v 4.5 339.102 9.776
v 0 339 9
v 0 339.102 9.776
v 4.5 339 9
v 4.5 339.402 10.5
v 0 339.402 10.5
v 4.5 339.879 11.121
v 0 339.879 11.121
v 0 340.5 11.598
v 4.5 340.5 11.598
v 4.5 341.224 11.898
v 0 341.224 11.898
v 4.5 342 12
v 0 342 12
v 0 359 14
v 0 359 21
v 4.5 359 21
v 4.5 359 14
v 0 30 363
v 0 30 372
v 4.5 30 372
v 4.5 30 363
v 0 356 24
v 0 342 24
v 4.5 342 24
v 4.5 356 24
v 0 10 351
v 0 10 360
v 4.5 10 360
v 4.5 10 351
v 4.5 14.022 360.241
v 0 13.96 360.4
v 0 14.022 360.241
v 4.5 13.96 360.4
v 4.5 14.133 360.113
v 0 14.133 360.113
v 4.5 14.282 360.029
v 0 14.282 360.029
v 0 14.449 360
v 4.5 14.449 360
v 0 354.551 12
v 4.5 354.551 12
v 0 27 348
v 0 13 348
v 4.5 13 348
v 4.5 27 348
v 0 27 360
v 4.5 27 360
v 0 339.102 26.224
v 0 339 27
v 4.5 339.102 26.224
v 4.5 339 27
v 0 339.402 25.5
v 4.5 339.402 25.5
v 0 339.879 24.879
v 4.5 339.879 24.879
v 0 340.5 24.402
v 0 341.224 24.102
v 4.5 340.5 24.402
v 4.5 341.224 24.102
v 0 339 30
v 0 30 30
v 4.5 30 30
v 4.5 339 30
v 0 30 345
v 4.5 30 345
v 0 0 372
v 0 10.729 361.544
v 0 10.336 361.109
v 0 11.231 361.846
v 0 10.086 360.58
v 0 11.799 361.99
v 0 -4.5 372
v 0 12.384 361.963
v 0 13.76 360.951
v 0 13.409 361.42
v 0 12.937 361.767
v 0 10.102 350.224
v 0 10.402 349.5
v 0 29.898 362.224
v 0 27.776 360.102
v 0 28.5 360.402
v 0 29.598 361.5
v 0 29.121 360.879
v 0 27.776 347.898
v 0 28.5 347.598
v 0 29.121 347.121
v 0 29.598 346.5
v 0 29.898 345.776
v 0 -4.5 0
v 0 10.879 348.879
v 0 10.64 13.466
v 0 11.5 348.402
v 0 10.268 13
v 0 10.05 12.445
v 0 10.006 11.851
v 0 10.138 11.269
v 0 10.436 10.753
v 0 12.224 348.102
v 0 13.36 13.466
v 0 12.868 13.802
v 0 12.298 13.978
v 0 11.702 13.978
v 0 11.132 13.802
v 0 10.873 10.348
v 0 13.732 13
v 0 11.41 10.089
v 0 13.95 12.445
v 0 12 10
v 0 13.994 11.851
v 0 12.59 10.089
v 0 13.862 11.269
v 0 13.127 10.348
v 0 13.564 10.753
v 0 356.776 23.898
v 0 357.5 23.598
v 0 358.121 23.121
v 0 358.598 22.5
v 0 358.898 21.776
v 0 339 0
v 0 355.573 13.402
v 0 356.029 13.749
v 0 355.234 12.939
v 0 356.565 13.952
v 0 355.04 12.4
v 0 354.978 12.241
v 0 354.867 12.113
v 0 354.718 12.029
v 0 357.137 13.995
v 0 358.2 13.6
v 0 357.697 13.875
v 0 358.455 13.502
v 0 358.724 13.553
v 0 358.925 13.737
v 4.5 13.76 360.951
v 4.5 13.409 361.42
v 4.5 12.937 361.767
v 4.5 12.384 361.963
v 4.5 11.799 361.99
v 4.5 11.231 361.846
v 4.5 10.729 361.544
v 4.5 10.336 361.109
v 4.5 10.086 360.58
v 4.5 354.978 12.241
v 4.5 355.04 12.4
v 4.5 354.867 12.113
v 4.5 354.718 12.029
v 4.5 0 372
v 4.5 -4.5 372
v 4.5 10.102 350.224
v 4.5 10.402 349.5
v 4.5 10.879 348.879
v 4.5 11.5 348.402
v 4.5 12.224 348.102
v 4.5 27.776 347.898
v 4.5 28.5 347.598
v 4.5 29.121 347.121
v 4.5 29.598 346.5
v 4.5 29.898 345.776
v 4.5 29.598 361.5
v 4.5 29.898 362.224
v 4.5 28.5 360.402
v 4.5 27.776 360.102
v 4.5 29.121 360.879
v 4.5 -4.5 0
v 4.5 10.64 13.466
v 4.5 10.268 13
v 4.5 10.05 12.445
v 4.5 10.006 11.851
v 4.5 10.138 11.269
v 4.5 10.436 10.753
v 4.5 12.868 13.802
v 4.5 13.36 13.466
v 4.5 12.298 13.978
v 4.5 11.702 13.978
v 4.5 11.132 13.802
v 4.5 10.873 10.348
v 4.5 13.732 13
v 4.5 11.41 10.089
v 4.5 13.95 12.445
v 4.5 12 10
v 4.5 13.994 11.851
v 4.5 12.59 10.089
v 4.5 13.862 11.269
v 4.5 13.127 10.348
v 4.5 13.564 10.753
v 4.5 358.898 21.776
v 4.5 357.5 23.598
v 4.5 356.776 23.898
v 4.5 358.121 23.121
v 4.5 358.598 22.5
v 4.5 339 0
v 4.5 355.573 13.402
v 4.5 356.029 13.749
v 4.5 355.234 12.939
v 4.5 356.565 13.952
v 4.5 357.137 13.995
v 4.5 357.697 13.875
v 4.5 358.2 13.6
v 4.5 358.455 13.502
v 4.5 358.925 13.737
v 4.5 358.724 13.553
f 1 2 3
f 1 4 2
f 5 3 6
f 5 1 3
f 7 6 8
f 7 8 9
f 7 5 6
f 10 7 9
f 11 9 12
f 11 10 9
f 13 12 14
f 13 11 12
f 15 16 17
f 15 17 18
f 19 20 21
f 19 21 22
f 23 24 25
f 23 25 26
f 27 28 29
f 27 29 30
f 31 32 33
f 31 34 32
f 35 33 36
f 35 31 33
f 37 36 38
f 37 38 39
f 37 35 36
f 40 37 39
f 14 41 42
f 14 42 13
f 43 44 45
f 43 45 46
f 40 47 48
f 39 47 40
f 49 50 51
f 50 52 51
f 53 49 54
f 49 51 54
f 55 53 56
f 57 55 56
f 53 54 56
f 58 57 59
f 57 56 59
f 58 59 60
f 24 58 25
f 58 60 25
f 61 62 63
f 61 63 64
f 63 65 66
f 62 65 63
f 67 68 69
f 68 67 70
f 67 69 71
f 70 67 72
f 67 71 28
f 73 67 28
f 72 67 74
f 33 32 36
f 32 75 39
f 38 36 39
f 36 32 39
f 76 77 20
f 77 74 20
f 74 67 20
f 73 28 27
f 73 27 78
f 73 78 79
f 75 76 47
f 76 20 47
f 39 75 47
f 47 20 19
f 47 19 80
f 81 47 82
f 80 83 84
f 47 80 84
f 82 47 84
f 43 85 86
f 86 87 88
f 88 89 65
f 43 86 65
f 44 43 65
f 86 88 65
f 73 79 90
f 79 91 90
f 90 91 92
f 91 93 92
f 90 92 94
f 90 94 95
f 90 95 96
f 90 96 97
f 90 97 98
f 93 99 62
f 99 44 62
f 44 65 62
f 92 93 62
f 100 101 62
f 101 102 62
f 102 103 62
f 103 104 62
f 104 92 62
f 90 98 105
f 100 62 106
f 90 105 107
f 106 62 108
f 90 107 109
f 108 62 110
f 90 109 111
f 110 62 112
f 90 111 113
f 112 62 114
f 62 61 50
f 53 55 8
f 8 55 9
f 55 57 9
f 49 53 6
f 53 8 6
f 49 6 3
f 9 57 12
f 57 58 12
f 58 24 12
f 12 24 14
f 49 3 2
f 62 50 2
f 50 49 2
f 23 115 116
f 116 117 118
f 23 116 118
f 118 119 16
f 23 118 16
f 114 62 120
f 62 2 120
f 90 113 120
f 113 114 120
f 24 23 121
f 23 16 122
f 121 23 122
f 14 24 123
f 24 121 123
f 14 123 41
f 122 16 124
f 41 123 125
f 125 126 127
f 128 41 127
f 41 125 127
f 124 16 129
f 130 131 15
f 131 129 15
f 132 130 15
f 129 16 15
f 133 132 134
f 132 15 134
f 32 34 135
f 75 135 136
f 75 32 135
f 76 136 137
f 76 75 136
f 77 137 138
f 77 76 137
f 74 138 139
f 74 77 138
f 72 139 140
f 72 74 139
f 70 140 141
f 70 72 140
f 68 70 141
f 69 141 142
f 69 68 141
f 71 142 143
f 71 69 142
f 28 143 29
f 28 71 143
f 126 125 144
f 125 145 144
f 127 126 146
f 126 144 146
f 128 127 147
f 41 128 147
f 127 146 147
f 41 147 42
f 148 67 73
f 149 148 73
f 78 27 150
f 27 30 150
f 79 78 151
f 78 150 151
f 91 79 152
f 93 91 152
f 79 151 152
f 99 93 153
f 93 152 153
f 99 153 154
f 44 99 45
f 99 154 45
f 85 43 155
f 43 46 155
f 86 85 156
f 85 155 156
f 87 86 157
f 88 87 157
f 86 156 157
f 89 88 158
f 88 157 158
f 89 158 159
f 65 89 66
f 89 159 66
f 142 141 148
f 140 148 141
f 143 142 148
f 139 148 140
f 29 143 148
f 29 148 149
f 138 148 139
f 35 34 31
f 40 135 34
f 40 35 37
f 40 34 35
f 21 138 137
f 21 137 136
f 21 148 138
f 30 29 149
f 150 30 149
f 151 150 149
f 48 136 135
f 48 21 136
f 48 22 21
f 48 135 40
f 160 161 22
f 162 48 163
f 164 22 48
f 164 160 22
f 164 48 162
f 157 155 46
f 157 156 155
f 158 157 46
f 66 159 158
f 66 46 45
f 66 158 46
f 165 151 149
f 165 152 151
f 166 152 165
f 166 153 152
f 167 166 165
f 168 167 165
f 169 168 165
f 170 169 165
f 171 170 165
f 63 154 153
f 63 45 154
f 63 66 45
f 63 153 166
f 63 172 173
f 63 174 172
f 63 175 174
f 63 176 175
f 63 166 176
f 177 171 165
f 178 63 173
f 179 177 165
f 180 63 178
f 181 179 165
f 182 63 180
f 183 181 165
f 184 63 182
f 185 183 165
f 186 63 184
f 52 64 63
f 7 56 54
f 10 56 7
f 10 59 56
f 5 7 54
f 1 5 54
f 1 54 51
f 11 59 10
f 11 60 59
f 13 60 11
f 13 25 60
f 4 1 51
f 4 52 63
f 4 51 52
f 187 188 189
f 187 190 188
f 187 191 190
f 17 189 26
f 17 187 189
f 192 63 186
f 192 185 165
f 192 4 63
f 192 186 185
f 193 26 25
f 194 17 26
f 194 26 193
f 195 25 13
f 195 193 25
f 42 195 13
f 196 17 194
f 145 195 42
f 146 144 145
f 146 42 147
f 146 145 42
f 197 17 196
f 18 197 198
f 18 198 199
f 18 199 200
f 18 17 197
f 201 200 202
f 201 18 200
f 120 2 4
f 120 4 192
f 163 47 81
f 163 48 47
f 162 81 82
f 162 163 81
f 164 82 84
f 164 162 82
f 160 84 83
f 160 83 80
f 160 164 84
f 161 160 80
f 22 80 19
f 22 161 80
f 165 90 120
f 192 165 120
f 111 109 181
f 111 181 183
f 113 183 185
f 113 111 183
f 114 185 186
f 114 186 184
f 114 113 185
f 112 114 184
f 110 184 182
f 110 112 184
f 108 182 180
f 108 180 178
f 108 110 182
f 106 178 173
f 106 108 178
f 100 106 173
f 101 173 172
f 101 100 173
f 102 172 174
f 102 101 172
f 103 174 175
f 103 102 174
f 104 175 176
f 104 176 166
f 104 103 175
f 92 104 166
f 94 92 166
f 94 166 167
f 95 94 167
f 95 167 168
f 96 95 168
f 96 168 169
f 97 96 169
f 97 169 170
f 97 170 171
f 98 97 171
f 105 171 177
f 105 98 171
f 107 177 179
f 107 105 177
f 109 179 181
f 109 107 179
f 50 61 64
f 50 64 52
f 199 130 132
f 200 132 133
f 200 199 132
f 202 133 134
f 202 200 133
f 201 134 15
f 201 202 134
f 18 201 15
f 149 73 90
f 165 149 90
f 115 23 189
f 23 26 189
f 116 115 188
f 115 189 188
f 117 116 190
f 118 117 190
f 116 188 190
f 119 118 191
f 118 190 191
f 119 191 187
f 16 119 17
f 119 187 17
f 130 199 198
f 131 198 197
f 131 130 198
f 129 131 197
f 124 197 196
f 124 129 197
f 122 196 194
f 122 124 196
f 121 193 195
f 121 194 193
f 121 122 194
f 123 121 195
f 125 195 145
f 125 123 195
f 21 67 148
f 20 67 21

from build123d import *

# Parameters (mm, degrees)
SKETCH2_R           = 2
BOSS_EXTRUDE1_DEPTH = 4.5
CUT_EXTRUDE1_DEPTH  = 517.996374688
FILLET2_R           = 0.5
FILLET4_R           = 0.5
FILLET5_R           = 0.5
FILLET6_R           = 3
FILLET7_R           = 3


with BuildPart() as part:
    # Sketch2 → Boss-Extrude1 (new body)
    # profile 1 of 2: a face of its own
    with BuildSketch(Plane(origin=(0, 0, 0), x_dir=(0, 0, -1), z_dir=(1, 0, 0))):
        Polygon((-12, 339), (0, 339), (0, 0), (-372, 0), (-372, 30), (-360, 30), (-360, 10), (-348, 10), (-348, 30), (-30, 30), (-30, 339), (-24, 339), (-24, 359), (-12, 359), align=None)
        with Locations((-12, 12)):
            Circle(SKETCH2_R, mode=Mode.SUBTRACT)
    # profile 2 of 2: a face of its own
    with BuildSketch(Plane(origin=(0, 0, 0), x_dir=(0, 0, -1), z_dir=(1, 0, 0))):
        Polygon((-372.000001936, -4.49995894), (0, -4.500002581), (0, 0), (-372, 0), align=None)
    extrude(amount=BOSS_EXTRUDE1_DEPTH)

    # Sketch3 → Cut-Extrude1 (cut, through all)
    with BuildSketch(Plane(origin=(0, 0, 0), x_dir=(0, 0, -1), z_dir=(1, 0, 0))):
        with BuildLine():
            Line((-360, 14), (-360, 10))
            ThreePointArc((-360, 10), (-358.585786438, 10.585786438), (-358, 12))
            ThreePointArc((-358, 12), (-358.585786438, 13.414213562), (-360, 14))
        make_face()
        with BuildLine():
            ThreePointArc((-360, 14), (-362, 12), (-360, 10))
            Line((-360, 10), (-360, 14))
        make_face()
        with BuildLine():
            ThreePointArc((-12, 355), (-10.585786438, 355.585786438), (-10, 357))
            ThreePointArc((-10, 357), (-10.585786438, 358.414213562), (-12, 359))
            Line((-12, 359), (-12, 355))
        make_face()
        with BuildLine():
            Line((-12, 355), (-12, 359))
            ThreePointArc((-12, 359), (-14, 357), (-12, 355))
        make_face()
    extrude(amount=CUT_EXTRUDE1_DEPTH, mode=Mode.SUBTRACT)

    # Fillet2
    fillet2_edges = [part.edges().sort_by_distance(p)[0] for p in [
        (2.25, 355, 12),
    ]]
    fillet(fillet2_edges, radius=FILLET2_R)

    # Fillet4
    fillet4_edges = [part.edges().sort_by_distance(p)[0] for p in [
        (2.25, 359, 12),
    ]]
    fillet(fillet4_edges, radius=FILLET4_R)

    # Fillet5
    fillet5_edges = [part.edges().sort_by_distance(p)[0] for p in [
        (2.25, 14, 360),
    ]]
    fillet(fillet5_edges, radius=FILLET5_R)

    # Fillet6
    fillet6_edges = [part.edges().sort_by_distance(p)[0] for p in [
        (2.25, 30, 360),
        (2.25, 30, 348),
        (2.25, 339, 24),
        (2.25, 339, 12),
    ]]
    fillet(fillet6_edges, radius=FILLET6_R)

    # Fillet7
    fillet7_edges = [part.edges().sort_by_distance(p)[0] for p in [
        (2.25, 10, 348),
        (2.25, 359, 24),
    ]]
    fillet(fillet7_edges, radius=FILLET7_R)


solid = part.part
